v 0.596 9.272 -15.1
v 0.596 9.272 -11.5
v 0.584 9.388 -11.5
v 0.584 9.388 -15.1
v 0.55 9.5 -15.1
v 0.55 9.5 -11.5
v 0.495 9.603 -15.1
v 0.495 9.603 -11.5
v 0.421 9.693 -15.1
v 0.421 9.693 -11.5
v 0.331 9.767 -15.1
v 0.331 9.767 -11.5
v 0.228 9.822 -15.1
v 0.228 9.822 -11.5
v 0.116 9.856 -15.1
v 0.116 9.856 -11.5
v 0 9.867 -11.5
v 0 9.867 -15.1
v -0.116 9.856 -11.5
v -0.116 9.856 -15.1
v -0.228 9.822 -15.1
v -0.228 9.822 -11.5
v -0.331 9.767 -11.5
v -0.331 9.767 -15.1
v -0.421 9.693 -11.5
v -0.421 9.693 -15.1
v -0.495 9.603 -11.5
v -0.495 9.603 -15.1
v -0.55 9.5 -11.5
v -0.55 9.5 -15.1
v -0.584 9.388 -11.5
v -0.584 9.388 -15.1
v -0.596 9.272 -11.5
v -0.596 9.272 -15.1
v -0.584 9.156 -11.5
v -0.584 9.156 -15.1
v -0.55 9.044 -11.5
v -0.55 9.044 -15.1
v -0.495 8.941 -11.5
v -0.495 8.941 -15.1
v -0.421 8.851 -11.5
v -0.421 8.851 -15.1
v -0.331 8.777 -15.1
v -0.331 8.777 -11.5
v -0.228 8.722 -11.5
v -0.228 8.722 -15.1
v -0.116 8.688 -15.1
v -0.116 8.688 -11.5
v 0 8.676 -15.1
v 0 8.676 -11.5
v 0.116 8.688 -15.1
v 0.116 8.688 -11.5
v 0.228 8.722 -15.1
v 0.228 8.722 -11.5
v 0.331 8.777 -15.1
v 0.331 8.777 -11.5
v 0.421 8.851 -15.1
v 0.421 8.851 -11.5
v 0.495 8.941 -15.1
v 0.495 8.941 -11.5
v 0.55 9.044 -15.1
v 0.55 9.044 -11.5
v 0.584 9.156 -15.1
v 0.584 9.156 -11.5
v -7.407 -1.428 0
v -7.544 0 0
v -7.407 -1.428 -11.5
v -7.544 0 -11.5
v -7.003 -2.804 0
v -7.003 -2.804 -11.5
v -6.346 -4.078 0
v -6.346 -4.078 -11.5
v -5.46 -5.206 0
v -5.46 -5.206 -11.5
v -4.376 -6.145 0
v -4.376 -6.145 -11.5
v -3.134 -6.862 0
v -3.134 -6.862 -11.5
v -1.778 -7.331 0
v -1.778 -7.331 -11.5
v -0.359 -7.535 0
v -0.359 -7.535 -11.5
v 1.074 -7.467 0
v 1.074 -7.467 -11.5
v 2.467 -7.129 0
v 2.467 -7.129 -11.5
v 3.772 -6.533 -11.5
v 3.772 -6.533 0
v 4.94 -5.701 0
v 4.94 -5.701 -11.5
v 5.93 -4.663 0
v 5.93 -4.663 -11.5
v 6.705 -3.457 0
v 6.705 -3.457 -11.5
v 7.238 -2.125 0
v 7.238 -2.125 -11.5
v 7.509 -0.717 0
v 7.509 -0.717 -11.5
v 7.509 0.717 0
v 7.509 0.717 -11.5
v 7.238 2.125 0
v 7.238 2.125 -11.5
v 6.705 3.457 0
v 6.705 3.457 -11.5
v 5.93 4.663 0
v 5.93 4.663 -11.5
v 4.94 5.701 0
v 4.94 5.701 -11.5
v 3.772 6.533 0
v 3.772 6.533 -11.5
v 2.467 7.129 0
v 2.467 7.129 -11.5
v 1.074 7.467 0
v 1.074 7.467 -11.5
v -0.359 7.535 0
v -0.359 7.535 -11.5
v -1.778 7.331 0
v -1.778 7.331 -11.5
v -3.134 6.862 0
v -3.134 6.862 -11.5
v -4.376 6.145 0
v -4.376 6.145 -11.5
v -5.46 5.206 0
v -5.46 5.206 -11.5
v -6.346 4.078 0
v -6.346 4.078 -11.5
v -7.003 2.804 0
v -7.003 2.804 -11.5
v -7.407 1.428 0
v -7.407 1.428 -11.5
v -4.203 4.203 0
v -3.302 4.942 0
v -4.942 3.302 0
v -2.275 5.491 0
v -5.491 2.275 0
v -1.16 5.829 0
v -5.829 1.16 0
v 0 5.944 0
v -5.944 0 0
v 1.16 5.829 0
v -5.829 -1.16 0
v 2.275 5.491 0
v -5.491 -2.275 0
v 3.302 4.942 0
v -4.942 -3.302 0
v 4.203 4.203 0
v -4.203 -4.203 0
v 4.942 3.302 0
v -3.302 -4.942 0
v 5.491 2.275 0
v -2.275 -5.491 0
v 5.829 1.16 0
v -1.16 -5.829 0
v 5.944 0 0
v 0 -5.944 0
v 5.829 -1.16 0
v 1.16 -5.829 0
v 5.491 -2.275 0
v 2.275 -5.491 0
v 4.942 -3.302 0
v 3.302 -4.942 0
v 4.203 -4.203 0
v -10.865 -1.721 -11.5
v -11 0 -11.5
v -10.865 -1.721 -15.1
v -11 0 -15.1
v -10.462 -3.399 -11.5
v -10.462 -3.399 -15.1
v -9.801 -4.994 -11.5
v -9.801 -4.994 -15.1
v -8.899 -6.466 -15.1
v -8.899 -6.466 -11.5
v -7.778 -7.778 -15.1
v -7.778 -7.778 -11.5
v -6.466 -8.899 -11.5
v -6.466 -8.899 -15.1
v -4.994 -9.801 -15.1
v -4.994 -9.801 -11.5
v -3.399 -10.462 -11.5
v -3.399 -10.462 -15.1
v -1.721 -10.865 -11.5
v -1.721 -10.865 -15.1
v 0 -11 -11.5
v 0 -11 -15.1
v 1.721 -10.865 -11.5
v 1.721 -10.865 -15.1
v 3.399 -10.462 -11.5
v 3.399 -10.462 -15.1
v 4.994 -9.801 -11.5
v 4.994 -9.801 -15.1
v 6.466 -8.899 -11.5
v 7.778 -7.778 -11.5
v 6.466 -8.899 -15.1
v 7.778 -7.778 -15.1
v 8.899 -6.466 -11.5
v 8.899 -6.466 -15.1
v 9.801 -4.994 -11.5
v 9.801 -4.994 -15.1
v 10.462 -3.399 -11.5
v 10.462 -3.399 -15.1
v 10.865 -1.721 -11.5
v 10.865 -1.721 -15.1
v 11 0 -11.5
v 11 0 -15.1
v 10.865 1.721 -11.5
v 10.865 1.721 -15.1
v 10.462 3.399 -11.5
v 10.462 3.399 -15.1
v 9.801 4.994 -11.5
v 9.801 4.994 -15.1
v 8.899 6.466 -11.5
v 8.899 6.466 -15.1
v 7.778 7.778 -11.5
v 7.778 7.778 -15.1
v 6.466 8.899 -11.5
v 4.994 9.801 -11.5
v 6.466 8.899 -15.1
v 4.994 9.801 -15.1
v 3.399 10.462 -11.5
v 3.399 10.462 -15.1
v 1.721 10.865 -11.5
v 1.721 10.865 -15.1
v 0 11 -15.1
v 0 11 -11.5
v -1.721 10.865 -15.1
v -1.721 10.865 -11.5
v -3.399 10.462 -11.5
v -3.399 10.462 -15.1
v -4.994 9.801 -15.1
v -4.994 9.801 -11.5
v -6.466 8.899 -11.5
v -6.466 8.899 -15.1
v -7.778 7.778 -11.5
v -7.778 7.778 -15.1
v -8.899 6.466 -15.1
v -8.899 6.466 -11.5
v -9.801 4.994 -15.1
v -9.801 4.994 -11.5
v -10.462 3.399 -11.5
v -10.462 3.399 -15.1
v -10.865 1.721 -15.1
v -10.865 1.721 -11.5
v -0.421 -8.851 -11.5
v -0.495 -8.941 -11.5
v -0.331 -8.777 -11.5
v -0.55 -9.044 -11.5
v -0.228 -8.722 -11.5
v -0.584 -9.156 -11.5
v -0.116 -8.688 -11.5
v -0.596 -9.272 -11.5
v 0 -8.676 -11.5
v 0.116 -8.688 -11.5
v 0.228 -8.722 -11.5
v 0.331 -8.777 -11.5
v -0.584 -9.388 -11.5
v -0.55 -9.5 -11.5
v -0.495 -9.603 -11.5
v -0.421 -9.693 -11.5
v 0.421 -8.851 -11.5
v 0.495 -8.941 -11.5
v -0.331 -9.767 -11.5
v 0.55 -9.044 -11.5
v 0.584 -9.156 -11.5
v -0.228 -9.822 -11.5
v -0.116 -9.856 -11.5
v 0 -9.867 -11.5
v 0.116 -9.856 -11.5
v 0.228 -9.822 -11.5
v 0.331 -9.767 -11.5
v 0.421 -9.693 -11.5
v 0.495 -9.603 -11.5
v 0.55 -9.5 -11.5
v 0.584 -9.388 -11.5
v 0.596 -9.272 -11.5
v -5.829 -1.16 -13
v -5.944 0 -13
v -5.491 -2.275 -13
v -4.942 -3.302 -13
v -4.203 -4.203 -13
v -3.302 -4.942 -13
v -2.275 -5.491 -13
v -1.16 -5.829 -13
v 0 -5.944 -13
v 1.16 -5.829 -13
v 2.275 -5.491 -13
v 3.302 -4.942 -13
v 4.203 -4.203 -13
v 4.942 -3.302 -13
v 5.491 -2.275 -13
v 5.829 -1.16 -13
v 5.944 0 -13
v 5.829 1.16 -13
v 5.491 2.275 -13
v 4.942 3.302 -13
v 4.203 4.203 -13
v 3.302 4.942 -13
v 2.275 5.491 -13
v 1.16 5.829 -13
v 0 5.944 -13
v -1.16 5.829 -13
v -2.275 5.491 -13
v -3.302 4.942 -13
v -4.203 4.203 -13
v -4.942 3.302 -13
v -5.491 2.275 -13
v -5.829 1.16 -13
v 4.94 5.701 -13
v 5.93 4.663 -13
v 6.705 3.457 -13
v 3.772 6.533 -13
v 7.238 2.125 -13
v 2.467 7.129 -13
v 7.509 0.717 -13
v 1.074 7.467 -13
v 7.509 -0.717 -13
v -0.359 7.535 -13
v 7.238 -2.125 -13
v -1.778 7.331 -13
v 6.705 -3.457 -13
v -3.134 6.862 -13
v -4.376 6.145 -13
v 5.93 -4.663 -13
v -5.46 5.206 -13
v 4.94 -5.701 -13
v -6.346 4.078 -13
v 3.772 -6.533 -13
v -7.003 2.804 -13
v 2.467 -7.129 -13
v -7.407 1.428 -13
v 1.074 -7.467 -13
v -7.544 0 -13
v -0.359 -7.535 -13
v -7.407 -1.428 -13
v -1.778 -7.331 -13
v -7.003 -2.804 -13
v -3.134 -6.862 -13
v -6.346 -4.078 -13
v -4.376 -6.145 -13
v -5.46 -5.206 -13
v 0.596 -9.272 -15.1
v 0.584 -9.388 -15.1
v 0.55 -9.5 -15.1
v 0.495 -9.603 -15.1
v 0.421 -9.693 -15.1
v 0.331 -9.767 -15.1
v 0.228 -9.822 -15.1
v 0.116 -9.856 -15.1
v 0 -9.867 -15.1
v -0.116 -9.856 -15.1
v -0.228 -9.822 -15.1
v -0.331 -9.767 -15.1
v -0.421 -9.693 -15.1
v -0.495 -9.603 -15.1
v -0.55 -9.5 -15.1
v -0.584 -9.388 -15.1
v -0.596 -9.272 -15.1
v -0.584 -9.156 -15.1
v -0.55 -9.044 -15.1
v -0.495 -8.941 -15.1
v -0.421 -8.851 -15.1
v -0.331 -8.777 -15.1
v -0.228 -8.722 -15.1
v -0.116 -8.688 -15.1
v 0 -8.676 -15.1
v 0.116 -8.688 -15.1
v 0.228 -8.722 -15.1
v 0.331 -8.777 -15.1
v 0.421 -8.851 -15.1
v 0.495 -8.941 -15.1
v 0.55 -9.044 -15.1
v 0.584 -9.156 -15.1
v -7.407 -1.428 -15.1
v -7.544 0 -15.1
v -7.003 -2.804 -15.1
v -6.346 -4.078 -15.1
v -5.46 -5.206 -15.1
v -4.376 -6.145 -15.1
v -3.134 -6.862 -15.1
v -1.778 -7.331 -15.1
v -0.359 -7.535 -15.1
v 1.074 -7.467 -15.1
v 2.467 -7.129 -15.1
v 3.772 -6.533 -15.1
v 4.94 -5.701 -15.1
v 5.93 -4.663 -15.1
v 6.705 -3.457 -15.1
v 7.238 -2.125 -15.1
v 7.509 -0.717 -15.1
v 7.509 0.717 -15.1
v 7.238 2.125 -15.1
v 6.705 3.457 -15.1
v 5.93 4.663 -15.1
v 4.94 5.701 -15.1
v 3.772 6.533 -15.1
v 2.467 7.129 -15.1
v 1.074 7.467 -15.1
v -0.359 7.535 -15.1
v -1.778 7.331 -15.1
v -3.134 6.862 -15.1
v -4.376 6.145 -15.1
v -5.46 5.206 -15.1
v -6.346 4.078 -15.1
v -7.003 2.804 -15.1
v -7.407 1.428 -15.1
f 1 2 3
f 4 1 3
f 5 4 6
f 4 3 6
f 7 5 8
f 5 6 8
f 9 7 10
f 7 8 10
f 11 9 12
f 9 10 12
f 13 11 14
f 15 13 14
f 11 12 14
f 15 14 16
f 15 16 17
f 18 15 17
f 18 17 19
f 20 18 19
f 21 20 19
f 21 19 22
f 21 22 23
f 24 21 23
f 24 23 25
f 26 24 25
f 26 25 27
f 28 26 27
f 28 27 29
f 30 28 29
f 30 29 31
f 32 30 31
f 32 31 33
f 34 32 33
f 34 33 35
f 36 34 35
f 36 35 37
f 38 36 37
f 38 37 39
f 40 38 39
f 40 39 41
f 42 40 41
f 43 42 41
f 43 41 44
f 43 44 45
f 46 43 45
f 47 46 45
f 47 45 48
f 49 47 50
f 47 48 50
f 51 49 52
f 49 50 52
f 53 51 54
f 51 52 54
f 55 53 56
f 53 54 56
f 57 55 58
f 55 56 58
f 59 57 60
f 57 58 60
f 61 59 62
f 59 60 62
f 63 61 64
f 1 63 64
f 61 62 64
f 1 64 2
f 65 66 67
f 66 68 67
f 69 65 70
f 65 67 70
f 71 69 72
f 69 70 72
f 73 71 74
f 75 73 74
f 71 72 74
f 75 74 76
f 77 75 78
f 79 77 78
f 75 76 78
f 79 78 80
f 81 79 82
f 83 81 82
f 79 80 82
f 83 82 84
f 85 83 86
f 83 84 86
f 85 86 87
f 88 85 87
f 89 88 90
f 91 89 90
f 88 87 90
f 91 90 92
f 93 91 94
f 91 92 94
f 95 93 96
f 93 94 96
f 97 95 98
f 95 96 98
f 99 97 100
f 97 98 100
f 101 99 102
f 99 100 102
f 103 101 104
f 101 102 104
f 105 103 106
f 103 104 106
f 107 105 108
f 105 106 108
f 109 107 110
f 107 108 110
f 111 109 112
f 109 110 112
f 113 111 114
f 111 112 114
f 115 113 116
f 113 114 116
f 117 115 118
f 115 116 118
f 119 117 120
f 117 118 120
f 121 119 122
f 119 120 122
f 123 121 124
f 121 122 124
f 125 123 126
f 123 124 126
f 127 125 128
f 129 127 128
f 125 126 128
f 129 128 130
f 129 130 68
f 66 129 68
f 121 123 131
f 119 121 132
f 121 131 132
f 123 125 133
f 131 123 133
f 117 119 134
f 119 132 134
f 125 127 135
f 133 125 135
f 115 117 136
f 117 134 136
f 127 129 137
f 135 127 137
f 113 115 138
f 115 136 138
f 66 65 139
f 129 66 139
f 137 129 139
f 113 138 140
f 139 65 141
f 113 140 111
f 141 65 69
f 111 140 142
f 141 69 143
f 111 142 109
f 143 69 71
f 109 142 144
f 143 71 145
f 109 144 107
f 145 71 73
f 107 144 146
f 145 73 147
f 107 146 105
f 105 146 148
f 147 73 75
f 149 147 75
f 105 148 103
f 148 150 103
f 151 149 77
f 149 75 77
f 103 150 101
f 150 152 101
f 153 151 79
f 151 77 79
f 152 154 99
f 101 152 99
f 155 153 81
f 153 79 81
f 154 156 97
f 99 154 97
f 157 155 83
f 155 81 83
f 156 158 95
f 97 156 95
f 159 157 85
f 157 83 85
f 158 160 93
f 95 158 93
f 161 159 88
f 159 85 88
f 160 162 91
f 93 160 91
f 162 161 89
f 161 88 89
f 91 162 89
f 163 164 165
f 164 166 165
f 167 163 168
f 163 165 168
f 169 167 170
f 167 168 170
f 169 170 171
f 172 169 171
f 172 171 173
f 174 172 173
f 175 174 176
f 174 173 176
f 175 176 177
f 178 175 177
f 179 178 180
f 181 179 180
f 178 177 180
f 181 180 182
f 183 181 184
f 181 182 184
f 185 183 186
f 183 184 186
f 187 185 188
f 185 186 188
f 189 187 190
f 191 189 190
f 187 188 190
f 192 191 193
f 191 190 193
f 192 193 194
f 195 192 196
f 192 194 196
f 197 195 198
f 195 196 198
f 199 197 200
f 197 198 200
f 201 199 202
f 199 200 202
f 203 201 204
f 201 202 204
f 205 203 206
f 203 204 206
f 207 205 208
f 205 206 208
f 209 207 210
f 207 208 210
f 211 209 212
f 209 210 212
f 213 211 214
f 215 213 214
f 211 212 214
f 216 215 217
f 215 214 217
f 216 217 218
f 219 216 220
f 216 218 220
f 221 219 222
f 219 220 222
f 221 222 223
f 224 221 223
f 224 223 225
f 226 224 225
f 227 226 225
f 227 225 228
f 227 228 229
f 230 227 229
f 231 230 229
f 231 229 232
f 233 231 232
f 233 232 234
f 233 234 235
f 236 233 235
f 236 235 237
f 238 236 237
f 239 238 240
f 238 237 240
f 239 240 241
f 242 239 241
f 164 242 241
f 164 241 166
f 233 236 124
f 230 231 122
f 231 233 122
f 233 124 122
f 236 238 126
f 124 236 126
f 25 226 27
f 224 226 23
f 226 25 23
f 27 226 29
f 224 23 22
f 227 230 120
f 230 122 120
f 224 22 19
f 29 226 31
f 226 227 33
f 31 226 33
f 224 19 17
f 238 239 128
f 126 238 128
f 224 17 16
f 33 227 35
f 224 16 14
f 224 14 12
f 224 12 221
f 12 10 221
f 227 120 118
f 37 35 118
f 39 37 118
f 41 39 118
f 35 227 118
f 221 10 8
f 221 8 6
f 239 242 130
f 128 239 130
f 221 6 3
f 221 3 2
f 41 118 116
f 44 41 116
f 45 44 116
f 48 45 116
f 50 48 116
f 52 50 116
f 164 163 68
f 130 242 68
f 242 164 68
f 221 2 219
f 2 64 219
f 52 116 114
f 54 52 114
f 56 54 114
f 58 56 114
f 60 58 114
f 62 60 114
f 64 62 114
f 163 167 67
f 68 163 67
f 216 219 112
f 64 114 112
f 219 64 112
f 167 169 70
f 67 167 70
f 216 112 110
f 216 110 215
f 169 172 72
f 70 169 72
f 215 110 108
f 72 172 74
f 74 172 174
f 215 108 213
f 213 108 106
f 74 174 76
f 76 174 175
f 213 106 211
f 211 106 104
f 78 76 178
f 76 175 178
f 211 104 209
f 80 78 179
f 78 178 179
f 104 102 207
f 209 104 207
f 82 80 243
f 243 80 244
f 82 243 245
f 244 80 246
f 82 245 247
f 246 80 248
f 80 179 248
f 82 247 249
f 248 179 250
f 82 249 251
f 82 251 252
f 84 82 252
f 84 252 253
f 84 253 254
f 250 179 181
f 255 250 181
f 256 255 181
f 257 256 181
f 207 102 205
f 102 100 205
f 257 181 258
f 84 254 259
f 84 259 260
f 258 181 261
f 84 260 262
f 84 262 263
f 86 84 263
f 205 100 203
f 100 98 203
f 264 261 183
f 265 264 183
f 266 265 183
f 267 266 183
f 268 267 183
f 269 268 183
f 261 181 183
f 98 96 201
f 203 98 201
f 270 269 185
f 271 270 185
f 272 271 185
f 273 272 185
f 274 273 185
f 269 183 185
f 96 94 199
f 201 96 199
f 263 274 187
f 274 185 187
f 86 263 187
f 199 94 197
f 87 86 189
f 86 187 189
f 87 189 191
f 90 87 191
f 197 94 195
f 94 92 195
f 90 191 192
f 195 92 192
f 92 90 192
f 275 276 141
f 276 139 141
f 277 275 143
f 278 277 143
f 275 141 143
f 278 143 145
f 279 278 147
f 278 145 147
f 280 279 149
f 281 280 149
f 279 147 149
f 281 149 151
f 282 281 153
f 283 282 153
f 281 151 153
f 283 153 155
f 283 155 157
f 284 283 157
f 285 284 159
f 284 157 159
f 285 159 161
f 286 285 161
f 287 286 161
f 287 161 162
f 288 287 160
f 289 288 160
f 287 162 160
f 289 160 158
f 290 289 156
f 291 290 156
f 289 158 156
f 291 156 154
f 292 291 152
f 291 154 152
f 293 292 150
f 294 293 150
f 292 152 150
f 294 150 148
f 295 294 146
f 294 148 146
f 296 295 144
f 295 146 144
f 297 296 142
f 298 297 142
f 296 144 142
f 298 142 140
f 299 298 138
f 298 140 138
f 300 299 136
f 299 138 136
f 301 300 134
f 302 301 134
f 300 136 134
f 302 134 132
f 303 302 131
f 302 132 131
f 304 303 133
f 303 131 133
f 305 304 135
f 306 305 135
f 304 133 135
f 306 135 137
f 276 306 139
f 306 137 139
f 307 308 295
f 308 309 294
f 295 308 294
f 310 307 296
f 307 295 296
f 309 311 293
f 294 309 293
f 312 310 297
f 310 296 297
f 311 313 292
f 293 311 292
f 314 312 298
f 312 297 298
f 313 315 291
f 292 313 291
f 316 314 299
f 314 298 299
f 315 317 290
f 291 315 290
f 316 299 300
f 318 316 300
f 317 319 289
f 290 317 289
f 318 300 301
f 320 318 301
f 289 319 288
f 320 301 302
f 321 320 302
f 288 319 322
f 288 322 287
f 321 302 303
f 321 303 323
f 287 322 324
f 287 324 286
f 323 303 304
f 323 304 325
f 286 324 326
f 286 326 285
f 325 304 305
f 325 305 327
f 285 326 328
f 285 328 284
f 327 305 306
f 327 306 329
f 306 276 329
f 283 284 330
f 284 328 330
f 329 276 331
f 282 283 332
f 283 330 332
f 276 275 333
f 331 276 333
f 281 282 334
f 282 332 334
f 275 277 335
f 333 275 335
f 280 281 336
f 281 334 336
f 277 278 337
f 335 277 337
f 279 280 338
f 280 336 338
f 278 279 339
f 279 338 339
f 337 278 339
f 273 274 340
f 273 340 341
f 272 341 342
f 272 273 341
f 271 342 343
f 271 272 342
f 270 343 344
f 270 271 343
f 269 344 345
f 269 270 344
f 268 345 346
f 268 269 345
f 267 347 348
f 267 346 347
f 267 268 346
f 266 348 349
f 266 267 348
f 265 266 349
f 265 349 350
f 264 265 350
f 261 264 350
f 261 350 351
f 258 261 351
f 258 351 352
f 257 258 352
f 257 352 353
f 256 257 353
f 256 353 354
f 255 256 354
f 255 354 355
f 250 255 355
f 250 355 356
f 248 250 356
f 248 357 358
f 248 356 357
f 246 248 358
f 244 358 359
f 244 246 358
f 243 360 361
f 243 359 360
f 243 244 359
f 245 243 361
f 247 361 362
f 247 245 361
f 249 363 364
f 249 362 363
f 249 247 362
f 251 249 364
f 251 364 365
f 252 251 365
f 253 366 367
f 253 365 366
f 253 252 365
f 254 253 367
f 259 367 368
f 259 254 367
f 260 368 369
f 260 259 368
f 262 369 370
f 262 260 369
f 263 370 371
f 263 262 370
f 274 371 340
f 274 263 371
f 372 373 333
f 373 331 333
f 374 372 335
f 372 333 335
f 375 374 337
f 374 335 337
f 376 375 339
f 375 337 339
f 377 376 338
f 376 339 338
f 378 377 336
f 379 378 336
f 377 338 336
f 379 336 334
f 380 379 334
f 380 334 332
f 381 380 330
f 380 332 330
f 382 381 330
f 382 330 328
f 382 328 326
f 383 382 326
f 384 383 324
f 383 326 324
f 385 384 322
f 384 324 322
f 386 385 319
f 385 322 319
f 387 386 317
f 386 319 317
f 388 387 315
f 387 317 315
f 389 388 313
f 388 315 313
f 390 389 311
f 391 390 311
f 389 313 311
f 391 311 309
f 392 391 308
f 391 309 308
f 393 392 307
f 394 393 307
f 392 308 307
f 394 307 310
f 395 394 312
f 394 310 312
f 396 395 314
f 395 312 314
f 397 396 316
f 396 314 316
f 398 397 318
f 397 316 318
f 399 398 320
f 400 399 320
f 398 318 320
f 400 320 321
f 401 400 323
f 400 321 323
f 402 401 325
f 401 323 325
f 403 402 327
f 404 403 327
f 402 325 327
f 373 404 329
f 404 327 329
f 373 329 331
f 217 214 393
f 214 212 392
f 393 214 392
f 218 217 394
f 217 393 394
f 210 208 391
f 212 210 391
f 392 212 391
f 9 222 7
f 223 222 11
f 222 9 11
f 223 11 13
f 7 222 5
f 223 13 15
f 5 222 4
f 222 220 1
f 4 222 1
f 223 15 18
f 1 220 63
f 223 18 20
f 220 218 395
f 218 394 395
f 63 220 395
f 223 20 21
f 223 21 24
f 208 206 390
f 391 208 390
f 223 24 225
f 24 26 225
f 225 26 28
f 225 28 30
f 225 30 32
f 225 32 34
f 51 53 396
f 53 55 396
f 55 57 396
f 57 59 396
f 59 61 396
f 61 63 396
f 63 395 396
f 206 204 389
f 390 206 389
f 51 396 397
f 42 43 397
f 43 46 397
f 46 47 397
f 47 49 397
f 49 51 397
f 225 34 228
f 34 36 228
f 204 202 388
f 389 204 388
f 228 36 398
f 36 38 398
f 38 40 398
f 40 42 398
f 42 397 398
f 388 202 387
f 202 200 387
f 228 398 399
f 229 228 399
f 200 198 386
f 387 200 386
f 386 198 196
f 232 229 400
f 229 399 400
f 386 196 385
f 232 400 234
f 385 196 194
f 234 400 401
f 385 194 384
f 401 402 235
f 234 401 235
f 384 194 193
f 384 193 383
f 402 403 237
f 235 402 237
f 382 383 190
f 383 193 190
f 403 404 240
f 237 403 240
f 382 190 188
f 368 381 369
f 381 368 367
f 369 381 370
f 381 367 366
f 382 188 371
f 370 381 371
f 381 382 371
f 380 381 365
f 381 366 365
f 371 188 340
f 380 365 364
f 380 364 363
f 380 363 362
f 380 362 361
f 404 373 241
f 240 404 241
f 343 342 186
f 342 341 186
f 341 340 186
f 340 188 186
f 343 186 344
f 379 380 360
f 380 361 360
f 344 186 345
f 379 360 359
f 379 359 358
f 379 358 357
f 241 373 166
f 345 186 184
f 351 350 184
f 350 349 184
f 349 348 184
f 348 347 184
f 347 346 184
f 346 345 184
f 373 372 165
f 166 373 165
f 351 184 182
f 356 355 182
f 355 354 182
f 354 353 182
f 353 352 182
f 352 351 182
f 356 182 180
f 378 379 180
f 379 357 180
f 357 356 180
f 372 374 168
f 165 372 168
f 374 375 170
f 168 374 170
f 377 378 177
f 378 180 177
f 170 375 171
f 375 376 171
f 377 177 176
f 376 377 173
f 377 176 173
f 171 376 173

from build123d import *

# Parameters (mm, degrees)
F_0_80_TAPPED_HOLE1_D = 1.19126


with BuildPart() as part:
    # Sketch1 → Revolve1 (revolve)
    with BuildSketch(Plane(origin=(0, 0, 0), x_dir=(0, 0, -1), z_dir=(1, 0, 0)), mode=Mode.PRIVATE) as revolve1_sk:
        Polygon((15.1, 11), (15.1, 7.5436), (13, 7.5436), (13, 5.9436), (0, 5.9436), (0, 7.5436), (11.5, 7.5436), (11.5, 11), align=None)
    revolve(revolve1_sk.sketch.rotate(Axis((0, 0, 0), (0, 0, 1)), 90), axis=Axis((0, 0, 0), (0, 0, 1)))  # turned: the seam where the file's is

    # #0-80 Tapped Hole1 (through all)
    with Locations(Plane(origin=(0, 0, -15.1), x_dir=(-1, 0, 0), z_dir=(0, 0, -1))):
        with Locations((0, 9.2718)):
            f_0_80_tapped_hole1 = Hole(F_0_80_TAPPED_HOLE1_D / 2)

    # Mirror1: #0-80 Tapped Hole1 across plane
    add(f_0_80_tapped_hole1.mirror(Plane.ZX), mode=Mode.SUBTRACT)


solid = part.part
